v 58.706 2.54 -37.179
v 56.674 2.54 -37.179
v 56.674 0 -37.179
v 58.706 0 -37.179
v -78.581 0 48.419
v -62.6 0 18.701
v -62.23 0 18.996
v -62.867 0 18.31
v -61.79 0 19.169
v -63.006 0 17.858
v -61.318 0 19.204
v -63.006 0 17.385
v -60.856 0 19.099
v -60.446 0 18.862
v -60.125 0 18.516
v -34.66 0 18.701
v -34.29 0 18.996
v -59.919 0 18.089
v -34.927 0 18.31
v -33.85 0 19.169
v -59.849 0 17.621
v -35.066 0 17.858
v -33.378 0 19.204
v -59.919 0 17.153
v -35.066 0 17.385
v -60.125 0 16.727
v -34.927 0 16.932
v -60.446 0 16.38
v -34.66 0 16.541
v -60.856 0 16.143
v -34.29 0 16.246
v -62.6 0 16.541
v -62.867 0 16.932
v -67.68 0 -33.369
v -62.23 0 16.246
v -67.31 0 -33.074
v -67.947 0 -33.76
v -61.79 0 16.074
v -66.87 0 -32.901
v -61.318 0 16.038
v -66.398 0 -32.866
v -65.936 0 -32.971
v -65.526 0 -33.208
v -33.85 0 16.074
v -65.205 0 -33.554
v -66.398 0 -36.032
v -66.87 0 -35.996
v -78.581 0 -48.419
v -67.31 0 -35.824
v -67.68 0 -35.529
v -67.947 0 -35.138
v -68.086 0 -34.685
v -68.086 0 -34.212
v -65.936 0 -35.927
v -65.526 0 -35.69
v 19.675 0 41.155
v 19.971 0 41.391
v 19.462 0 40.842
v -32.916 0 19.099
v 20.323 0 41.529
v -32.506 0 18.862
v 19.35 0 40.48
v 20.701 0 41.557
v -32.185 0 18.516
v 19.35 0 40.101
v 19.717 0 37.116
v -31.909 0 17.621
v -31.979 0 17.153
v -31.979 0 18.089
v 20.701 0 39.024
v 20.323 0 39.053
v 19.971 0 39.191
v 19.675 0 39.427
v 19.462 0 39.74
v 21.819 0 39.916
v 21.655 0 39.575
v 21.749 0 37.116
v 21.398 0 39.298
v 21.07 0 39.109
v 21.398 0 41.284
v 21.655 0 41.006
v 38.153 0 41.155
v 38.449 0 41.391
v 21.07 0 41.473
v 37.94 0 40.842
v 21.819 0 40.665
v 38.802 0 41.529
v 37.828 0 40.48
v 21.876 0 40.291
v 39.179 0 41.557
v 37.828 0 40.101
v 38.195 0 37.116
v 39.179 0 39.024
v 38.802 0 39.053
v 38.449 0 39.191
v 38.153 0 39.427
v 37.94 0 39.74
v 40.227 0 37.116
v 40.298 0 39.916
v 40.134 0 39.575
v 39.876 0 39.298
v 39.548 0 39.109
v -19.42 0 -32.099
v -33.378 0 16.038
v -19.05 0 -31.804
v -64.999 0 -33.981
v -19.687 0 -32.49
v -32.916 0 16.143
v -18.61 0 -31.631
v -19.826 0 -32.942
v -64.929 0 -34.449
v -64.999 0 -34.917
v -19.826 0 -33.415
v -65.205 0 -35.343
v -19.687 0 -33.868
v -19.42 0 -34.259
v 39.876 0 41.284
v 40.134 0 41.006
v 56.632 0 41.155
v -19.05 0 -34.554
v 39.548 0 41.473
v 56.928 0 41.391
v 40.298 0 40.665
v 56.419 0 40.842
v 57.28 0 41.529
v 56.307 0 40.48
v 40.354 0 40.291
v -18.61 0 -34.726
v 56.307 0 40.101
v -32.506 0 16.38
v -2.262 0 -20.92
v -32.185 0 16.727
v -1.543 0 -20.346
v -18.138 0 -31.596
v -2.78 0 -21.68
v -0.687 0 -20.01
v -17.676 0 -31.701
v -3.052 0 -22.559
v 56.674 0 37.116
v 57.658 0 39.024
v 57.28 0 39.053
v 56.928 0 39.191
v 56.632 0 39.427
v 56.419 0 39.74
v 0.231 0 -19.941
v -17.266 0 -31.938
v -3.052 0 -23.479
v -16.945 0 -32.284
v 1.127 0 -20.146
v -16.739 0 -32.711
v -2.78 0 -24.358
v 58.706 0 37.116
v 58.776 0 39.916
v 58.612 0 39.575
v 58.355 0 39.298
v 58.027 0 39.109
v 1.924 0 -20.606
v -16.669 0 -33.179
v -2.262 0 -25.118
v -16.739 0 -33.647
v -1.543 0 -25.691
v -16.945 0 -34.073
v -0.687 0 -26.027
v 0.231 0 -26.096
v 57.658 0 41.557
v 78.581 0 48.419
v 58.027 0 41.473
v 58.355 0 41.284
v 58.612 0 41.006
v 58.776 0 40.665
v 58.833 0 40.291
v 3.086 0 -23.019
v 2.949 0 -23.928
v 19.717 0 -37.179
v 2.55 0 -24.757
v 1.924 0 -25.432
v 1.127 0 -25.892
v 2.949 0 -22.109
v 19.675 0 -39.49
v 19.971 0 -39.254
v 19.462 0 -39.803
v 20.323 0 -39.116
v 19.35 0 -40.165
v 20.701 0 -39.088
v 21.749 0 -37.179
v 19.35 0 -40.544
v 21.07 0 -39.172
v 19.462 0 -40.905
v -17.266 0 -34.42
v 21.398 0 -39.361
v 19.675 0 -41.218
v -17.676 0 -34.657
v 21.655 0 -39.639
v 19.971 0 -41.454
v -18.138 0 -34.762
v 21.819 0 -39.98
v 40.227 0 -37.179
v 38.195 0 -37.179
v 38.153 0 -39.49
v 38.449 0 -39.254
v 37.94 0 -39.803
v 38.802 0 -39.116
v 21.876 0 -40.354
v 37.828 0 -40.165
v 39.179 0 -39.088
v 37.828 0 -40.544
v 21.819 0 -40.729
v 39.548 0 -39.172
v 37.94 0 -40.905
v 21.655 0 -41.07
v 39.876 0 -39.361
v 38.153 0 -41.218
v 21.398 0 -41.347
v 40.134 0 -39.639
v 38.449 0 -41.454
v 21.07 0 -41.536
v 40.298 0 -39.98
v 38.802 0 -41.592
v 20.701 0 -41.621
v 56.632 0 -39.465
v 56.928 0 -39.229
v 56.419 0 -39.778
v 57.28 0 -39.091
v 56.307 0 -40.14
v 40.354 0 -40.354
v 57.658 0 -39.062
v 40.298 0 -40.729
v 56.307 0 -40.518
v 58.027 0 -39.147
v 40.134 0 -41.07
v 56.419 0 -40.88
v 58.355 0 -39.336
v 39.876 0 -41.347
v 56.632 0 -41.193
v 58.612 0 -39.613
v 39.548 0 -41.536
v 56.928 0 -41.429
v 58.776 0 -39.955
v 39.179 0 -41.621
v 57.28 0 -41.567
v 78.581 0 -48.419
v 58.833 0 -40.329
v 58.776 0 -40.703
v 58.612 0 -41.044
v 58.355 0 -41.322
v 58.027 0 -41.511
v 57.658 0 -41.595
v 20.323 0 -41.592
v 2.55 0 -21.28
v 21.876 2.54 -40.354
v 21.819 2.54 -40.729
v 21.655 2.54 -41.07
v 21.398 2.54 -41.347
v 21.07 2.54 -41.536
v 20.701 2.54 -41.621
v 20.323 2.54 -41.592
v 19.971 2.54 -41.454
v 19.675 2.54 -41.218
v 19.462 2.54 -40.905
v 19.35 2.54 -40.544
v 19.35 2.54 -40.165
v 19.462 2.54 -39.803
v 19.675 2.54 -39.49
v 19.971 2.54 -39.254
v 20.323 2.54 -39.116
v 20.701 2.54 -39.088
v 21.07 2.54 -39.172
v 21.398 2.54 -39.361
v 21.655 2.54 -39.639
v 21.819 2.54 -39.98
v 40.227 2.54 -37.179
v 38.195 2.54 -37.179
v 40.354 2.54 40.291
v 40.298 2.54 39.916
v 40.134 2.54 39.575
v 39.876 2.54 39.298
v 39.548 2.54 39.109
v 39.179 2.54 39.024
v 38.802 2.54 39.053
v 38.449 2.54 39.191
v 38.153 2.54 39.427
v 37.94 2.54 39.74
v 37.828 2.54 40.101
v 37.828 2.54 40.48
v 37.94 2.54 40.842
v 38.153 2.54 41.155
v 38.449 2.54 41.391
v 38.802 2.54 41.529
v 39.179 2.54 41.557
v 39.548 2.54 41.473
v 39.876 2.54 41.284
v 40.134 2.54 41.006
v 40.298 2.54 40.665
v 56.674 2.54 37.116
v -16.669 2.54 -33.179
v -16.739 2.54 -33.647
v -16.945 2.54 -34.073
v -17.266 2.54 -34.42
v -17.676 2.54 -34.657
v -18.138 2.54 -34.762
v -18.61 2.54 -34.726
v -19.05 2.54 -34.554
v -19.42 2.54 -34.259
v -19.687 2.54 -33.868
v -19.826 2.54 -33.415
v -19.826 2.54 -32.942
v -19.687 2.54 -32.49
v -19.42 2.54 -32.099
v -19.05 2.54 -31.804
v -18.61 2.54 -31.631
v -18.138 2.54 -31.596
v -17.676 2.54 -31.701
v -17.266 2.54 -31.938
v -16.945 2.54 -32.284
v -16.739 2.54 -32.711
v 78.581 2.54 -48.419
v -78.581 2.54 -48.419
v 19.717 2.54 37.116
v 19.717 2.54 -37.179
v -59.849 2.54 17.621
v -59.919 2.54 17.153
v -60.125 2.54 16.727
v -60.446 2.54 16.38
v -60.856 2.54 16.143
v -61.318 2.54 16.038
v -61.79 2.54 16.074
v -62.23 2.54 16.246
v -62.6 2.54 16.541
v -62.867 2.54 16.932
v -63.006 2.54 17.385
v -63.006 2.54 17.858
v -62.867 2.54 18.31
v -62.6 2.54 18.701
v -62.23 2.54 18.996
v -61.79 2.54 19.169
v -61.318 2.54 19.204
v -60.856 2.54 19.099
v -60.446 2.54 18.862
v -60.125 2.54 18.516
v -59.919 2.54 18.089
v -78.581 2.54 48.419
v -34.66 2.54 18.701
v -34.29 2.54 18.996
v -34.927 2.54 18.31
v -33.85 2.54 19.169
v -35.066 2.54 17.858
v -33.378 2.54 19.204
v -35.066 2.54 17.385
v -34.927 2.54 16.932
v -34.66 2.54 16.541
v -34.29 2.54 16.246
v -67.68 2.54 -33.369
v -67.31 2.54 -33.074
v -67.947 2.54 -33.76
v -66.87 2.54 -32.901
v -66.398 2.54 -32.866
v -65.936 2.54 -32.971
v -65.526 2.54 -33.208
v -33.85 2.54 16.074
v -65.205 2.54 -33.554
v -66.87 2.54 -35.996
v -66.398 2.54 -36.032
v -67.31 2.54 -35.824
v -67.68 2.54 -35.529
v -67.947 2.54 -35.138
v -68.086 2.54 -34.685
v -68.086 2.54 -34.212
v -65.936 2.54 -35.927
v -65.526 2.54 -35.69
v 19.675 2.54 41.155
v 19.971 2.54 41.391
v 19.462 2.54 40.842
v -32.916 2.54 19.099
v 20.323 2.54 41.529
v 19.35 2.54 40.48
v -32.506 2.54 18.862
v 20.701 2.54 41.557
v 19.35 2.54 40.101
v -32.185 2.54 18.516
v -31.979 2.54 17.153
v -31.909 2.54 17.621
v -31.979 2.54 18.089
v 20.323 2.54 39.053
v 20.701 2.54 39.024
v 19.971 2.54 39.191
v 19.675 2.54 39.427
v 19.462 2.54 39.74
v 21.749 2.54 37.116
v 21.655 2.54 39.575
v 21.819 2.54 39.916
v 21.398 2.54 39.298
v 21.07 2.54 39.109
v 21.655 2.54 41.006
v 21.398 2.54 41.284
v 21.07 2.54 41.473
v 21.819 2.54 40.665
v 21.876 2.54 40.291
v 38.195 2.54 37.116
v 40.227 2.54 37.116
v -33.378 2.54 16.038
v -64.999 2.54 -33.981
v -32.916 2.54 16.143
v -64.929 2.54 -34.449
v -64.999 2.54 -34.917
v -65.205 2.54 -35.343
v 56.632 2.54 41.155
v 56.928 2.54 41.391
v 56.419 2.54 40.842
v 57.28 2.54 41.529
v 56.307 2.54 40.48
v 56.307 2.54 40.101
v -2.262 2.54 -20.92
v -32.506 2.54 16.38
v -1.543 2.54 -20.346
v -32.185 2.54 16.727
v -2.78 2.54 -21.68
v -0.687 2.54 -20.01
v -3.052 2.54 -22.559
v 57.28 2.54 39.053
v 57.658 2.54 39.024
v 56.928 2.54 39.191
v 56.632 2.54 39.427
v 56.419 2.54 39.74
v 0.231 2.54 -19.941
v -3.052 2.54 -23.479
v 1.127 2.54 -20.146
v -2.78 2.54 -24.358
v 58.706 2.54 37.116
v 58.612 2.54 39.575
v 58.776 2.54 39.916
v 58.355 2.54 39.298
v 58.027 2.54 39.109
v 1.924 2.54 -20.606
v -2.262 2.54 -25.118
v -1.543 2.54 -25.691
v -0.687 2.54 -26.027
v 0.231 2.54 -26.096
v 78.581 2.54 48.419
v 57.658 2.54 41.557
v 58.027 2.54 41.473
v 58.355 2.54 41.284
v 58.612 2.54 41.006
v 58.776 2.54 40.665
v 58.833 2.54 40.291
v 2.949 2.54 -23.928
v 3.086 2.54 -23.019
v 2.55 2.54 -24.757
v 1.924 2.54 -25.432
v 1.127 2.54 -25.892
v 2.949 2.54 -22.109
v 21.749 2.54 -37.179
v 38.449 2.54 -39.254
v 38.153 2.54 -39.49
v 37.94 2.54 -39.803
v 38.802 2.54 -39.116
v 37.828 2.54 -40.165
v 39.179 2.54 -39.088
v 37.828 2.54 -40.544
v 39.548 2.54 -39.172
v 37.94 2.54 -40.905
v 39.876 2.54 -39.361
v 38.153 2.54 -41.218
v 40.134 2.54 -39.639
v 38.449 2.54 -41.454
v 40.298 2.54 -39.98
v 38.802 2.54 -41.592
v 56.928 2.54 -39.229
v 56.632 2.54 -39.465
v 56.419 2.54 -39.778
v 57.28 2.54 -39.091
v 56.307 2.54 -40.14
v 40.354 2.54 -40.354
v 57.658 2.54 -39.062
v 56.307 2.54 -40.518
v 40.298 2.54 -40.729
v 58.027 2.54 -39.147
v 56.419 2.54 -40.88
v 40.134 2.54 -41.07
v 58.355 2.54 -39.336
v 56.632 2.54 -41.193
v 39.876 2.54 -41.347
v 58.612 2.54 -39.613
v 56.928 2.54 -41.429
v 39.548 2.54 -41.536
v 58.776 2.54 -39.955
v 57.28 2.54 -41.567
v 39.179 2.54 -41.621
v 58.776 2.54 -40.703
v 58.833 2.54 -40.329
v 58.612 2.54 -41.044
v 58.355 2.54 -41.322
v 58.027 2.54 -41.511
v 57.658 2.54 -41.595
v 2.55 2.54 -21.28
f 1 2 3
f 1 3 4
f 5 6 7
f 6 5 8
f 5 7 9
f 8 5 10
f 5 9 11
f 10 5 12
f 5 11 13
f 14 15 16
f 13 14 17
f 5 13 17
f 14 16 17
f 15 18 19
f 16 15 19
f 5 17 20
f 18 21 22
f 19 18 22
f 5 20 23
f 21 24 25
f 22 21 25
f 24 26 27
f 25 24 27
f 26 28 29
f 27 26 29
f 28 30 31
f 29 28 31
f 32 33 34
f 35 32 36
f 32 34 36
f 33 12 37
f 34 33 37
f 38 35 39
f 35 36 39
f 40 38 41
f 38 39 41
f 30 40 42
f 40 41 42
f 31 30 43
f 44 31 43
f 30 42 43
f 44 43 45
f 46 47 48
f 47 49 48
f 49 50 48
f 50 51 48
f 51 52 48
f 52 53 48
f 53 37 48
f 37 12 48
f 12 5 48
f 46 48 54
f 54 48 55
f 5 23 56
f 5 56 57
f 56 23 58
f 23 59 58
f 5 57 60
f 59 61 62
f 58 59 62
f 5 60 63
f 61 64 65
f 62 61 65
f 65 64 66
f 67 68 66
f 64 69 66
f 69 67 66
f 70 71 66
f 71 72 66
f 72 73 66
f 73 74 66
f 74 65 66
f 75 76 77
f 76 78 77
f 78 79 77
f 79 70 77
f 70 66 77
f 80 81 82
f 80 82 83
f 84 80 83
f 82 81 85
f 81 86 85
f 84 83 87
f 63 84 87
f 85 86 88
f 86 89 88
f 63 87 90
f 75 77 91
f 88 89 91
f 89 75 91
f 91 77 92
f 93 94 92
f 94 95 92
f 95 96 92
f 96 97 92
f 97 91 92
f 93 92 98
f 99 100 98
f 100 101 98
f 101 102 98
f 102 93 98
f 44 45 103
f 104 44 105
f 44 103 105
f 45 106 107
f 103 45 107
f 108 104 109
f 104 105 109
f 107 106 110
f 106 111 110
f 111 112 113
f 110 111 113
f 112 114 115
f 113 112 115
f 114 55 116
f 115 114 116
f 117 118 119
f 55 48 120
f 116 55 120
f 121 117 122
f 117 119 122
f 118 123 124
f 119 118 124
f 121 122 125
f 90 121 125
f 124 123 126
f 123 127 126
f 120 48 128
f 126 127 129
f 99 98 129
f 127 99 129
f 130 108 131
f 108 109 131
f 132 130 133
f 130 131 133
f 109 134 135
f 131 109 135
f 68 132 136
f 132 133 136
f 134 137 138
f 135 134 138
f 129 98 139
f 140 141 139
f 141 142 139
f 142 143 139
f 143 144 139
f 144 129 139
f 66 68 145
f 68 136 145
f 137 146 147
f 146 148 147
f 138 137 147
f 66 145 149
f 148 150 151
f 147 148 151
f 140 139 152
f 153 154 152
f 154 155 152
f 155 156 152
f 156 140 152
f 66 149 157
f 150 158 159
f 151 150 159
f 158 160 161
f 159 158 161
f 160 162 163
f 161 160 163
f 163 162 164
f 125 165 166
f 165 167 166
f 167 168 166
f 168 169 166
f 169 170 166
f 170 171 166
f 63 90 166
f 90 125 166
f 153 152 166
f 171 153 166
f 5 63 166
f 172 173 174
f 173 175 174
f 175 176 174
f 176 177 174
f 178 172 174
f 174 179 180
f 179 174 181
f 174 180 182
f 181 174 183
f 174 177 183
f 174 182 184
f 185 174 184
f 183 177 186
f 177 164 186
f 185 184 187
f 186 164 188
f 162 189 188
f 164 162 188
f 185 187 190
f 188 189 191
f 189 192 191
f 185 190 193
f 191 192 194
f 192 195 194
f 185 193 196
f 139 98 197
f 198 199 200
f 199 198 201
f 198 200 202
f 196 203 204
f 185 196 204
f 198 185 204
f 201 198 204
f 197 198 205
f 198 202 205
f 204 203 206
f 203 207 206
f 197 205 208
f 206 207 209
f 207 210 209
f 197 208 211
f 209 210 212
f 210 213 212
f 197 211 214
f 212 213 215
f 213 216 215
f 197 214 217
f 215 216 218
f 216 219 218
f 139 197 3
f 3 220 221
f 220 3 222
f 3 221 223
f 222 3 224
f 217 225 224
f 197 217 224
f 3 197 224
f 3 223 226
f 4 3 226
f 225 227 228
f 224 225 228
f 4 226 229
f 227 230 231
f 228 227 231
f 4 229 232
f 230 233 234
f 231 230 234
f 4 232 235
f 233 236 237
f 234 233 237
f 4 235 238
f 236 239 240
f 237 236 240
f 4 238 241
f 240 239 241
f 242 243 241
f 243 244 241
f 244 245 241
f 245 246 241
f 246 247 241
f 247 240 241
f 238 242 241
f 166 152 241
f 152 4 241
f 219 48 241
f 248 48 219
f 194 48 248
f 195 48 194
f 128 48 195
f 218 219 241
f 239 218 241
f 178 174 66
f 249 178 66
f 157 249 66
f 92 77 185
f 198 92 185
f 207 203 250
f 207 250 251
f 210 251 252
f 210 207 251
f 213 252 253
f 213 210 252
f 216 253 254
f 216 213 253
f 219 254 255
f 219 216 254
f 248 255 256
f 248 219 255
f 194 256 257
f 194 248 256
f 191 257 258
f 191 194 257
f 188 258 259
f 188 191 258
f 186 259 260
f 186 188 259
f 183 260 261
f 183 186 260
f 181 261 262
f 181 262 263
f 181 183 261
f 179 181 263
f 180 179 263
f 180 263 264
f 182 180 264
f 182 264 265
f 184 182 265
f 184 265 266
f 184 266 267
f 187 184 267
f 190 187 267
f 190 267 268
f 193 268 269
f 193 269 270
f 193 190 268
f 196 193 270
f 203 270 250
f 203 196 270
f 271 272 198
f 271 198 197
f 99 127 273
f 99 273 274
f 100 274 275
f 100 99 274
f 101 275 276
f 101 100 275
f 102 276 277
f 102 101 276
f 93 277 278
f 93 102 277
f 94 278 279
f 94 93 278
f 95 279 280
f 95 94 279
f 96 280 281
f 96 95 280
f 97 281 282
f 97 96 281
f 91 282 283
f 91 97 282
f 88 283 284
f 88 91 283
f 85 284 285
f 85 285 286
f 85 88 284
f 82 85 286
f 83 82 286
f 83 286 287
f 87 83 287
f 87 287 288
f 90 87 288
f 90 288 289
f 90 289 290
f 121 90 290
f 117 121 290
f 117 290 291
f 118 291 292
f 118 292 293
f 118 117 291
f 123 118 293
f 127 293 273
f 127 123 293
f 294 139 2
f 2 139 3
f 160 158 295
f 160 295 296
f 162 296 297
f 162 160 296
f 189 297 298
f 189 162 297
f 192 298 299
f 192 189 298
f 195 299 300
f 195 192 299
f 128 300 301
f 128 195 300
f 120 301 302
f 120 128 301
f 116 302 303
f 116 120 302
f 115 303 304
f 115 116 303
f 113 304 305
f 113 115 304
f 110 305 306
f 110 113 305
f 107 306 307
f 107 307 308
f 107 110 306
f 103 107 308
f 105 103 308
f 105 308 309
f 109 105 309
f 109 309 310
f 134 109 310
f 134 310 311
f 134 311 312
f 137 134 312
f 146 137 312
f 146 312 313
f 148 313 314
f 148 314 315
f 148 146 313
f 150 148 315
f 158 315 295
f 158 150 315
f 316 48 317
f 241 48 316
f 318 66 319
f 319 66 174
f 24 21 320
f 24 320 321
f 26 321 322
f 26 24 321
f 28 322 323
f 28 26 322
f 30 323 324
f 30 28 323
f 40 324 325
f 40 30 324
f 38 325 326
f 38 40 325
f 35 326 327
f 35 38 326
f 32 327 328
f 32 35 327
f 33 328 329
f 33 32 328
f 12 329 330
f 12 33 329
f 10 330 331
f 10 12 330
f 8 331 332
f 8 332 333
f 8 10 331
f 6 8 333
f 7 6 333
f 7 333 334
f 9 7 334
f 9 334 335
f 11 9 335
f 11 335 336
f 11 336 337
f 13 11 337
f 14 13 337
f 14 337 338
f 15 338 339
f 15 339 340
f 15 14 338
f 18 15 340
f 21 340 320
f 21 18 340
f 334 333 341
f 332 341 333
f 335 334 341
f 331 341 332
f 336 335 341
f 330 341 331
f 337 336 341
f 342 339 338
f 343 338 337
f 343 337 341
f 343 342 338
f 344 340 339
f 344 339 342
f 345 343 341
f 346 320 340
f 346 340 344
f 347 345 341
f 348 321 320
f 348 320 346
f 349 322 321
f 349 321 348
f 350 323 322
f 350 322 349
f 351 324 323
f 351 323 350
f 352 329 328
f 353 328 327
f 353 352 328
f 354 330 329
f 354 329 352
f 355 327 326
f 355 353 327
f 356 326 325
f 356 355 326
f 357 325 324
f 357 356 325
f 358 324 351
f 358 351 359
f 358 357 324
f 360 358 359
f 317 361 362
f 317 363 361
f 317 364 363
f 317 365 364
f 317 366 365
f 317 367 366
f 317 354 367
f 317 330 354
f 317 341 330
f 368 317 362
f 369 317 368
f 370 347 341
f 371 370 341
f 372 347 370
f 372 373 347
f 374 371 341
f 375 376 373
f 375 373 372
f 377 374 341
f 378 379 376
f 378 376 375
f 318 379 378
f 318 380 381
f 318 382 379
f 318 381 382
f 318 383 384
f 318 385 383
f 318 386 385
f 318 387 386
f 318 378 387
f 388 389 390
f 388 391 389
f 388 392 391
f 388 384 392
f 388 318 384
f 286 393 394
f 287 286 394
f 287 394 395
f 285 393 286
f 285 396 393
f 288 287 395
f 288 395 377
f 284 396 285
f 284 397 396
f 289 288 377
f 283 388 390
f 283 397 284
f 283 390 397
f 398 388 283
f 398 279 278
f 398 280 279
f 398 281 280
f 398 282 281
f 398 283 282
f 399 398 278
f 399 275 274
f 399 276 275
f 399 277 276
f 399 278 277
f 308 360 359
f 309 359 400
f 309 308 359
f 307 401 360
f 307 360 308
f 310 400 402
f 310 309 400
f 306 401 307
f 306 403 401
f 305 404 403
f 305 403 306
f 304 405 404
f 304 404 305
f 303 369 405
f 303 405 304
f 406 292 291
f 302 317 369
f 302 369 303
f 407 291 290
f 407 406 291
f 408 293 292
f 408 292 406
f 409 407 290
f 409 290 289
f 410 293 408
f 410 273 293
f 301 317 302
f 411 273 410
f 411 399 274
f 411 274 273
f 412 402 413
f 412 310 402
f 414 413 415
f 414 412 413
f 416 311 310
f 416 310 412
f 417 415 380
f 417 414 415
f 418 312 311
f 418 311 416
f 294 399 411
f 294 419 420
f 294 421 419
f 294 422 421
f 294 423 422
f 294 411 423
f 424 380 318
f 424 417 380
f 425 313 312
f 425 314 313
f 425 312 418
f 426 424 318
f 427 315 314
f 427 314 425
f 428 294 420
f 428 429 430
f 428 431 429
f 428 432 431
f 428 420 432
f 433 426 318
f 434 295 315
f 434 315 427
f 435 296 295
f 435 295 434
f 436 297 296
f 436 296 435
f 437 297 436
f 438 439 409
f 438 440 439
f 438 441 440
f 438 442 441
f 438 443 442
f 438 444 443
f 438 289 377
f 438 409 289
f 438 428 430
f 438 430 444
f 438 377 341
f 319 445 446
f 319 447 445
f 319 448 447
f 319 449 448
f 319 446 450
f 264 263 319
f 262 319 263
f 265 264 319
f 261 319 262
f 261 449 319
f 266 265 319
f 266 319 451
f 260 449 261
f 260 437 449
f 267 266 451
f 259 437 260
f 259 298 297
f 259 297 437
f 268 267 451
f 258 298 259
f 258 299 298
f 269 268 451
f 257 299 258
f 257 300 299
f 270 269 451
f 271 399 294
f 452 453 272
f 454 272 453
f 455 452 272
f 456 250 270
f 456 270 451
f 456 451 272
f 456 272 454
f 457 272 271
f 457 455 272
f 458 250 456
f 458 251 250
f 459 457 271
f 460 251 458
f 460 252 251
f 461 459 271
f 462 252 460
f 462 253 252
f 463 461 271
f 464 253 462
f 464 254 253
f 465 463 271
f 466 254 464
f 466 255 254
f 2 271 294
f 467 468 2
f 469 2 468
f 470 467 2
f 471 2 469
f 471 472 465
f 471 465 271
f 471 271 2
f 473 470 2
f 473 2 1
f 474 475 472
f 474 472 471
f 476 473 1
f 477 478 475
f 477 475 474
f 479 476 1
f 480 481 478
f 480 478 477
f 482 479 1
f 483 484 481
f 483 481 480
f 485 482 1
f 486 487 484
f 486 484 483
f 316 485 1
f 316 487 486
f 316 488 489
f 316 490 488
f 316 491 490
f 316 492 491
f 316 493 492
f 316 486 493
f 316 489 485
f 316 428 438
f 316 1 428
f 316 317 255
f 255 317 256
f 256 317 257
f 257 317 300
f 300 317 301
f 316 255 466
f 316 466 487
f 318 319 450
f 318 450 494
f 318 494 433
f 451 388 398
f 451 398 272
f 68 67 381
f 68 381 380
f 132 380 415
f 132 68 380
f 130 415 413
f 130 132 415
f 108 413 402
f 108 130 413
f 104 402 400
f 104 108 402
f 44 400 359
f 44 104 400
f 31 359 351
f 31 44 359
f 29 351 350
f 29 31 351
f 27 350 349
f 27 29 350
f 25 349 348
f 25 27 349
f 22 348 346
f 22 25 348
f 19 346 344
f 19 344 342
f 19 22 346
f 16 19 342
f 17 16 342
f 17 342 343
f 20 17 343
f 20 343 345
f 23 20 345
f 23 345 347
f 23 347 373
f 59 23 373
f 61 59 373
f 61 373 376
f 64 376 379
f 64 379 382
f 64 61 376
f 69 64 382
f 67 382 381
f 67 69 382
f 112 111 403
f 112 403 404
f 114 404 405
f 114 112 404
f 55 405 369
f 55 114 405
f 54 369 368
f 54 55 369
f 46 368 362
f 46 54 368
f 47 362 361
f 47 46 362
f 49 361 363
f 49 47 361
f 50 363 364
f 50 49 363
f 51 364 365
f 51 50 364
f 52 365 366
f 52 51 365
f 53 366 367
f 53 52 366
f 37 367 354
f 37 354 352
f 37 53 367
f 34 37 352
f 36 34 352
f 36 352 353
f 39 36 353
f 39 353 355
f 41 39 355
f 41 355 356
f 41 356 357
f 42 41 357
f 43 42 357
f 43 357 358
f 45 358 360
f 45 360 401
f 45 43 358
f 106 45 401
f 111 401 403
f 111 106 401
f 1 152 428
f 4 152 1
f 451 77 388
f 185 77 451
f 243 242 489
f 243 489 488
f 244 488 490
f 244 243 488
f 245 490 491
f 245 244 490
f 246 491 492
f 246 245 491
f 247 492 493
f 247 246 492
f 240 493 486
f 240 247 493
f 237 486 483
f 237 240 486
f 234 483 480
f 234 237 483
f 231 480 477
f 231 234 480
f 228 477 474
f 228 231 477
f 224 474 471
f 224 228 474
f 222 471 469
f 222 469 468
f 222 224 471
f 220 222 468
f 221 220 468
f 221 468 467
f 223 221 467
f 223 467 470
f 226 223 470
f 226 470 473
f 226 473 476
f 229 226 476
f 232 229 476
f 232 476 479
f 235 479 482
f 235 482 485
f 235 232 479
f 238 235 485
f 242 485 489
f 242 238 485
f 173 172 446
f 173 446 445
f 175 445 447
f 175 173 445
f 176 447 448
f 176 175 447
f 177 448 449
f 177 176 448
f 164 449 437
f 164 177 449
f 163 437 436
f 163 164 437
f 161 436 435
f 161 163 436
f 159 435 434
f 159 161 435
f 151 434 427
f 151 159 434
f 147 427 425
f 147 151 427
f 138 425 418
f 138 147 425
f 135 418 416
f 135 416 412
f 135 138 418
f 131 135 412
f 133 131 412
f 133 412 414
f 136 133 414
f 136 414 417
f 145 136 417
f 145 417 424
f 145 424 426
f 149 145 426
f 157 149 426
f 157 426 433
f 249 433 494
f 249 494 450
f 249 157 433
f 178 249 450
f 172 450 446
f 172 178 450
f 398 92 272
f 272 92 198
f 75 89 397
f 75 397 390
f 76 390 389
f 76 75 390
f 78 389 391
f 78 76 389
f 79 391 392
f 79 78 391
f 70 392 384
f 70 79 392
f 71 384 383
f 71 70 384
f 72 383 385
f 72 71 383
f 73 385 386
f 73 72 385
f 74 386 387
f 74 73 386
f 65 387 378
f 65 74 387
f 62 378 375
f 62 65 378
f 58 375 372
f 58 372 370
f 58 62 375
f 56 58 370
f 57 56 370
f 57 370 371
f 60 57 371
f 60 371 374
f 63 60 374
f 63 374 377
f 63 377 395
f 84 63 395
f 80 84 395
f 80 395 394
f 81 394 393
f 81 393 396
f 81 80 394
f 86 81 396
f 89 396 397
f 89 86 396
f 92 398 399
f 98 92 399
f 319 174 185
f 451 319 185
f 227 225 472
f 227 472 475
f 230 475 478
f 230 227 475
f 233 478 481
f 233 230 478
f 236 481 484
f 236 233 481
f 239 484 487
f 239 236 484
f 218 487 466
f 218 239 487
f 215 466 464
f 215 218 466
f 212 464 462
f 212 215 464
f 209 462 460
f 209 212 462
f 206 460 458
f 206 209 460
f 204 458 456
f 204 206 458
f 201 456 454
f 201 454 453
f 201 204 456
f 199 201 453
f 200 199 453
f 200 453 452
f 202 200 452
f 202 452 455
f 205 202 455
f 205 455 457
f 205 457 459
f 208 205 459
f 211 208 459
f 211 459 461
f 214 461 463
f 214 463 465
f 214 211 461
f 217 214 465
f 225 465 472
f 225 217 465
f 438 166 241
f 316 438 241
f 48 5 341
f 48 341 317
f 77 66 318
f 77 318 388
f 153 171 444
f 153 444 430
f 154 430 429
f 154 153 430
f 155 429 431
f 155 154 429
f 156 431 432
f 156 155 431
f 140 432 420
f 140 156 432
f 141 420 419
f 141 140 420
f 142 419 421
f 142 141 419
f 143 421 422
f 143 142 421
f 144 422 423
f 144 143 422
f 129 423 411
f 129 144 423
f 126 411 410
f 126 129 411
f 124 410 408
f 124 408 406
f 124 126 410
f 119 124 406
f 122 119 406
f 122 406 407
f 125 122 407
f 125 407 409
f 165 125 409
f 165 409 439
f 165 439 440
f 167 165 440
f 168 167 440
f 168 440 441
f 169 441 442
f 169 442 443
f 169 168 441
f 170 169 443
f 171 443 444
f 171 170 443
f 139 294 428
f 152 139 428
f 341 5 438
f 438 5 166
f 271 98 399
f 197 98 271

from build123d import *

# Parameters (mm, degrees)
SKETCH1_W           = 157.1625
SKETCH1_H           = 96.8375
SKETCH1_R           = 1.5875
SKETCH1_R_2         = 1.27
SKETCH1_R_3         = 3.0861
SKETCH1_W_2         = 2.032
SKETCH1_H_2         = 74.295
BOSS_EXTRUDE1_DEPTH = 2.54


with BuildPart() as part:
    # Sketch1 → Boss-Extrude1 (new body)
    with BuildSketch(Plane(origin=(0, 0, 0), x_dir=(1, 0, 0), z_dir=(0, 1, 0))):
        Rectangle(SKETCH1_W, SKETCH1_H)
        with Locations((-66.51625, 34.44875)):
            Circle(SKETCH1_R, mode=Mode.SUBTRACT)
        with Locations((-61.43625, -17.62125)):
            Circle(SKETCH1_R, mode=Mode.SUBTRACT)
        with Locations((-33.49625, -17.62125)):
            Circle(SKETCH1_R, mode=Mode.SUBTRACT)
        with Locations((-18.25625, 33.17875)):
            Circle(SKETCH1_R, mode=Mode.SUBTRACT)
        with Locations((57.56275, 40.32885)):
            Circle(SKETCH1_R_2, mode=Mode.SUBTRACT)
        with Locations((39.08425, 40.35425)):
            Circle(SKETCH1_R_2, mode=Mode.SUBTRACT)
        with Locations((20.60575, 40.35425)):
            Circle(SKETCH1_R_2, mode=Mode.SUBTRACT)
        with Locations((57.56275, -40.29075)):
            Circle(SKETCH1_R_2, mode=Mode.SUBTRACT)
        with Locations((39.08425, -40.29075)):
            Circle(SKETCH1_R_2, mode=Mode.SUBTRACT)
        with Locations((20.60575, -40.29075)):
            Circle(SKETCH1_R_2, mode=Mode.SUBTRACT)
        with Locations((0, 23.01875)):
            Circle(SKETCH1_R_3, mode=Mode.SUBTRACT)
        with Locations((20.73275, 0.03175)):
            Rectangle(SKETCH1_W_2, SKETCH1_H_2, mode=Mode.SUBTRACT)
        with Locations((39.21125, 0.03175)):
            Rectangle(SKETCH1_W_2, SKETCH1_H_2, mode=Mode.SUBTRACT)
        with Locations((57.68975, 0.03175)):
            Rectangle(SKETCH1_W_2, SKETCH1_H_2, mode=Mode.SUBTRACT)
    extrude(amount=BOSS_EXTRUDE1_DEPTH)


solid = part.part
